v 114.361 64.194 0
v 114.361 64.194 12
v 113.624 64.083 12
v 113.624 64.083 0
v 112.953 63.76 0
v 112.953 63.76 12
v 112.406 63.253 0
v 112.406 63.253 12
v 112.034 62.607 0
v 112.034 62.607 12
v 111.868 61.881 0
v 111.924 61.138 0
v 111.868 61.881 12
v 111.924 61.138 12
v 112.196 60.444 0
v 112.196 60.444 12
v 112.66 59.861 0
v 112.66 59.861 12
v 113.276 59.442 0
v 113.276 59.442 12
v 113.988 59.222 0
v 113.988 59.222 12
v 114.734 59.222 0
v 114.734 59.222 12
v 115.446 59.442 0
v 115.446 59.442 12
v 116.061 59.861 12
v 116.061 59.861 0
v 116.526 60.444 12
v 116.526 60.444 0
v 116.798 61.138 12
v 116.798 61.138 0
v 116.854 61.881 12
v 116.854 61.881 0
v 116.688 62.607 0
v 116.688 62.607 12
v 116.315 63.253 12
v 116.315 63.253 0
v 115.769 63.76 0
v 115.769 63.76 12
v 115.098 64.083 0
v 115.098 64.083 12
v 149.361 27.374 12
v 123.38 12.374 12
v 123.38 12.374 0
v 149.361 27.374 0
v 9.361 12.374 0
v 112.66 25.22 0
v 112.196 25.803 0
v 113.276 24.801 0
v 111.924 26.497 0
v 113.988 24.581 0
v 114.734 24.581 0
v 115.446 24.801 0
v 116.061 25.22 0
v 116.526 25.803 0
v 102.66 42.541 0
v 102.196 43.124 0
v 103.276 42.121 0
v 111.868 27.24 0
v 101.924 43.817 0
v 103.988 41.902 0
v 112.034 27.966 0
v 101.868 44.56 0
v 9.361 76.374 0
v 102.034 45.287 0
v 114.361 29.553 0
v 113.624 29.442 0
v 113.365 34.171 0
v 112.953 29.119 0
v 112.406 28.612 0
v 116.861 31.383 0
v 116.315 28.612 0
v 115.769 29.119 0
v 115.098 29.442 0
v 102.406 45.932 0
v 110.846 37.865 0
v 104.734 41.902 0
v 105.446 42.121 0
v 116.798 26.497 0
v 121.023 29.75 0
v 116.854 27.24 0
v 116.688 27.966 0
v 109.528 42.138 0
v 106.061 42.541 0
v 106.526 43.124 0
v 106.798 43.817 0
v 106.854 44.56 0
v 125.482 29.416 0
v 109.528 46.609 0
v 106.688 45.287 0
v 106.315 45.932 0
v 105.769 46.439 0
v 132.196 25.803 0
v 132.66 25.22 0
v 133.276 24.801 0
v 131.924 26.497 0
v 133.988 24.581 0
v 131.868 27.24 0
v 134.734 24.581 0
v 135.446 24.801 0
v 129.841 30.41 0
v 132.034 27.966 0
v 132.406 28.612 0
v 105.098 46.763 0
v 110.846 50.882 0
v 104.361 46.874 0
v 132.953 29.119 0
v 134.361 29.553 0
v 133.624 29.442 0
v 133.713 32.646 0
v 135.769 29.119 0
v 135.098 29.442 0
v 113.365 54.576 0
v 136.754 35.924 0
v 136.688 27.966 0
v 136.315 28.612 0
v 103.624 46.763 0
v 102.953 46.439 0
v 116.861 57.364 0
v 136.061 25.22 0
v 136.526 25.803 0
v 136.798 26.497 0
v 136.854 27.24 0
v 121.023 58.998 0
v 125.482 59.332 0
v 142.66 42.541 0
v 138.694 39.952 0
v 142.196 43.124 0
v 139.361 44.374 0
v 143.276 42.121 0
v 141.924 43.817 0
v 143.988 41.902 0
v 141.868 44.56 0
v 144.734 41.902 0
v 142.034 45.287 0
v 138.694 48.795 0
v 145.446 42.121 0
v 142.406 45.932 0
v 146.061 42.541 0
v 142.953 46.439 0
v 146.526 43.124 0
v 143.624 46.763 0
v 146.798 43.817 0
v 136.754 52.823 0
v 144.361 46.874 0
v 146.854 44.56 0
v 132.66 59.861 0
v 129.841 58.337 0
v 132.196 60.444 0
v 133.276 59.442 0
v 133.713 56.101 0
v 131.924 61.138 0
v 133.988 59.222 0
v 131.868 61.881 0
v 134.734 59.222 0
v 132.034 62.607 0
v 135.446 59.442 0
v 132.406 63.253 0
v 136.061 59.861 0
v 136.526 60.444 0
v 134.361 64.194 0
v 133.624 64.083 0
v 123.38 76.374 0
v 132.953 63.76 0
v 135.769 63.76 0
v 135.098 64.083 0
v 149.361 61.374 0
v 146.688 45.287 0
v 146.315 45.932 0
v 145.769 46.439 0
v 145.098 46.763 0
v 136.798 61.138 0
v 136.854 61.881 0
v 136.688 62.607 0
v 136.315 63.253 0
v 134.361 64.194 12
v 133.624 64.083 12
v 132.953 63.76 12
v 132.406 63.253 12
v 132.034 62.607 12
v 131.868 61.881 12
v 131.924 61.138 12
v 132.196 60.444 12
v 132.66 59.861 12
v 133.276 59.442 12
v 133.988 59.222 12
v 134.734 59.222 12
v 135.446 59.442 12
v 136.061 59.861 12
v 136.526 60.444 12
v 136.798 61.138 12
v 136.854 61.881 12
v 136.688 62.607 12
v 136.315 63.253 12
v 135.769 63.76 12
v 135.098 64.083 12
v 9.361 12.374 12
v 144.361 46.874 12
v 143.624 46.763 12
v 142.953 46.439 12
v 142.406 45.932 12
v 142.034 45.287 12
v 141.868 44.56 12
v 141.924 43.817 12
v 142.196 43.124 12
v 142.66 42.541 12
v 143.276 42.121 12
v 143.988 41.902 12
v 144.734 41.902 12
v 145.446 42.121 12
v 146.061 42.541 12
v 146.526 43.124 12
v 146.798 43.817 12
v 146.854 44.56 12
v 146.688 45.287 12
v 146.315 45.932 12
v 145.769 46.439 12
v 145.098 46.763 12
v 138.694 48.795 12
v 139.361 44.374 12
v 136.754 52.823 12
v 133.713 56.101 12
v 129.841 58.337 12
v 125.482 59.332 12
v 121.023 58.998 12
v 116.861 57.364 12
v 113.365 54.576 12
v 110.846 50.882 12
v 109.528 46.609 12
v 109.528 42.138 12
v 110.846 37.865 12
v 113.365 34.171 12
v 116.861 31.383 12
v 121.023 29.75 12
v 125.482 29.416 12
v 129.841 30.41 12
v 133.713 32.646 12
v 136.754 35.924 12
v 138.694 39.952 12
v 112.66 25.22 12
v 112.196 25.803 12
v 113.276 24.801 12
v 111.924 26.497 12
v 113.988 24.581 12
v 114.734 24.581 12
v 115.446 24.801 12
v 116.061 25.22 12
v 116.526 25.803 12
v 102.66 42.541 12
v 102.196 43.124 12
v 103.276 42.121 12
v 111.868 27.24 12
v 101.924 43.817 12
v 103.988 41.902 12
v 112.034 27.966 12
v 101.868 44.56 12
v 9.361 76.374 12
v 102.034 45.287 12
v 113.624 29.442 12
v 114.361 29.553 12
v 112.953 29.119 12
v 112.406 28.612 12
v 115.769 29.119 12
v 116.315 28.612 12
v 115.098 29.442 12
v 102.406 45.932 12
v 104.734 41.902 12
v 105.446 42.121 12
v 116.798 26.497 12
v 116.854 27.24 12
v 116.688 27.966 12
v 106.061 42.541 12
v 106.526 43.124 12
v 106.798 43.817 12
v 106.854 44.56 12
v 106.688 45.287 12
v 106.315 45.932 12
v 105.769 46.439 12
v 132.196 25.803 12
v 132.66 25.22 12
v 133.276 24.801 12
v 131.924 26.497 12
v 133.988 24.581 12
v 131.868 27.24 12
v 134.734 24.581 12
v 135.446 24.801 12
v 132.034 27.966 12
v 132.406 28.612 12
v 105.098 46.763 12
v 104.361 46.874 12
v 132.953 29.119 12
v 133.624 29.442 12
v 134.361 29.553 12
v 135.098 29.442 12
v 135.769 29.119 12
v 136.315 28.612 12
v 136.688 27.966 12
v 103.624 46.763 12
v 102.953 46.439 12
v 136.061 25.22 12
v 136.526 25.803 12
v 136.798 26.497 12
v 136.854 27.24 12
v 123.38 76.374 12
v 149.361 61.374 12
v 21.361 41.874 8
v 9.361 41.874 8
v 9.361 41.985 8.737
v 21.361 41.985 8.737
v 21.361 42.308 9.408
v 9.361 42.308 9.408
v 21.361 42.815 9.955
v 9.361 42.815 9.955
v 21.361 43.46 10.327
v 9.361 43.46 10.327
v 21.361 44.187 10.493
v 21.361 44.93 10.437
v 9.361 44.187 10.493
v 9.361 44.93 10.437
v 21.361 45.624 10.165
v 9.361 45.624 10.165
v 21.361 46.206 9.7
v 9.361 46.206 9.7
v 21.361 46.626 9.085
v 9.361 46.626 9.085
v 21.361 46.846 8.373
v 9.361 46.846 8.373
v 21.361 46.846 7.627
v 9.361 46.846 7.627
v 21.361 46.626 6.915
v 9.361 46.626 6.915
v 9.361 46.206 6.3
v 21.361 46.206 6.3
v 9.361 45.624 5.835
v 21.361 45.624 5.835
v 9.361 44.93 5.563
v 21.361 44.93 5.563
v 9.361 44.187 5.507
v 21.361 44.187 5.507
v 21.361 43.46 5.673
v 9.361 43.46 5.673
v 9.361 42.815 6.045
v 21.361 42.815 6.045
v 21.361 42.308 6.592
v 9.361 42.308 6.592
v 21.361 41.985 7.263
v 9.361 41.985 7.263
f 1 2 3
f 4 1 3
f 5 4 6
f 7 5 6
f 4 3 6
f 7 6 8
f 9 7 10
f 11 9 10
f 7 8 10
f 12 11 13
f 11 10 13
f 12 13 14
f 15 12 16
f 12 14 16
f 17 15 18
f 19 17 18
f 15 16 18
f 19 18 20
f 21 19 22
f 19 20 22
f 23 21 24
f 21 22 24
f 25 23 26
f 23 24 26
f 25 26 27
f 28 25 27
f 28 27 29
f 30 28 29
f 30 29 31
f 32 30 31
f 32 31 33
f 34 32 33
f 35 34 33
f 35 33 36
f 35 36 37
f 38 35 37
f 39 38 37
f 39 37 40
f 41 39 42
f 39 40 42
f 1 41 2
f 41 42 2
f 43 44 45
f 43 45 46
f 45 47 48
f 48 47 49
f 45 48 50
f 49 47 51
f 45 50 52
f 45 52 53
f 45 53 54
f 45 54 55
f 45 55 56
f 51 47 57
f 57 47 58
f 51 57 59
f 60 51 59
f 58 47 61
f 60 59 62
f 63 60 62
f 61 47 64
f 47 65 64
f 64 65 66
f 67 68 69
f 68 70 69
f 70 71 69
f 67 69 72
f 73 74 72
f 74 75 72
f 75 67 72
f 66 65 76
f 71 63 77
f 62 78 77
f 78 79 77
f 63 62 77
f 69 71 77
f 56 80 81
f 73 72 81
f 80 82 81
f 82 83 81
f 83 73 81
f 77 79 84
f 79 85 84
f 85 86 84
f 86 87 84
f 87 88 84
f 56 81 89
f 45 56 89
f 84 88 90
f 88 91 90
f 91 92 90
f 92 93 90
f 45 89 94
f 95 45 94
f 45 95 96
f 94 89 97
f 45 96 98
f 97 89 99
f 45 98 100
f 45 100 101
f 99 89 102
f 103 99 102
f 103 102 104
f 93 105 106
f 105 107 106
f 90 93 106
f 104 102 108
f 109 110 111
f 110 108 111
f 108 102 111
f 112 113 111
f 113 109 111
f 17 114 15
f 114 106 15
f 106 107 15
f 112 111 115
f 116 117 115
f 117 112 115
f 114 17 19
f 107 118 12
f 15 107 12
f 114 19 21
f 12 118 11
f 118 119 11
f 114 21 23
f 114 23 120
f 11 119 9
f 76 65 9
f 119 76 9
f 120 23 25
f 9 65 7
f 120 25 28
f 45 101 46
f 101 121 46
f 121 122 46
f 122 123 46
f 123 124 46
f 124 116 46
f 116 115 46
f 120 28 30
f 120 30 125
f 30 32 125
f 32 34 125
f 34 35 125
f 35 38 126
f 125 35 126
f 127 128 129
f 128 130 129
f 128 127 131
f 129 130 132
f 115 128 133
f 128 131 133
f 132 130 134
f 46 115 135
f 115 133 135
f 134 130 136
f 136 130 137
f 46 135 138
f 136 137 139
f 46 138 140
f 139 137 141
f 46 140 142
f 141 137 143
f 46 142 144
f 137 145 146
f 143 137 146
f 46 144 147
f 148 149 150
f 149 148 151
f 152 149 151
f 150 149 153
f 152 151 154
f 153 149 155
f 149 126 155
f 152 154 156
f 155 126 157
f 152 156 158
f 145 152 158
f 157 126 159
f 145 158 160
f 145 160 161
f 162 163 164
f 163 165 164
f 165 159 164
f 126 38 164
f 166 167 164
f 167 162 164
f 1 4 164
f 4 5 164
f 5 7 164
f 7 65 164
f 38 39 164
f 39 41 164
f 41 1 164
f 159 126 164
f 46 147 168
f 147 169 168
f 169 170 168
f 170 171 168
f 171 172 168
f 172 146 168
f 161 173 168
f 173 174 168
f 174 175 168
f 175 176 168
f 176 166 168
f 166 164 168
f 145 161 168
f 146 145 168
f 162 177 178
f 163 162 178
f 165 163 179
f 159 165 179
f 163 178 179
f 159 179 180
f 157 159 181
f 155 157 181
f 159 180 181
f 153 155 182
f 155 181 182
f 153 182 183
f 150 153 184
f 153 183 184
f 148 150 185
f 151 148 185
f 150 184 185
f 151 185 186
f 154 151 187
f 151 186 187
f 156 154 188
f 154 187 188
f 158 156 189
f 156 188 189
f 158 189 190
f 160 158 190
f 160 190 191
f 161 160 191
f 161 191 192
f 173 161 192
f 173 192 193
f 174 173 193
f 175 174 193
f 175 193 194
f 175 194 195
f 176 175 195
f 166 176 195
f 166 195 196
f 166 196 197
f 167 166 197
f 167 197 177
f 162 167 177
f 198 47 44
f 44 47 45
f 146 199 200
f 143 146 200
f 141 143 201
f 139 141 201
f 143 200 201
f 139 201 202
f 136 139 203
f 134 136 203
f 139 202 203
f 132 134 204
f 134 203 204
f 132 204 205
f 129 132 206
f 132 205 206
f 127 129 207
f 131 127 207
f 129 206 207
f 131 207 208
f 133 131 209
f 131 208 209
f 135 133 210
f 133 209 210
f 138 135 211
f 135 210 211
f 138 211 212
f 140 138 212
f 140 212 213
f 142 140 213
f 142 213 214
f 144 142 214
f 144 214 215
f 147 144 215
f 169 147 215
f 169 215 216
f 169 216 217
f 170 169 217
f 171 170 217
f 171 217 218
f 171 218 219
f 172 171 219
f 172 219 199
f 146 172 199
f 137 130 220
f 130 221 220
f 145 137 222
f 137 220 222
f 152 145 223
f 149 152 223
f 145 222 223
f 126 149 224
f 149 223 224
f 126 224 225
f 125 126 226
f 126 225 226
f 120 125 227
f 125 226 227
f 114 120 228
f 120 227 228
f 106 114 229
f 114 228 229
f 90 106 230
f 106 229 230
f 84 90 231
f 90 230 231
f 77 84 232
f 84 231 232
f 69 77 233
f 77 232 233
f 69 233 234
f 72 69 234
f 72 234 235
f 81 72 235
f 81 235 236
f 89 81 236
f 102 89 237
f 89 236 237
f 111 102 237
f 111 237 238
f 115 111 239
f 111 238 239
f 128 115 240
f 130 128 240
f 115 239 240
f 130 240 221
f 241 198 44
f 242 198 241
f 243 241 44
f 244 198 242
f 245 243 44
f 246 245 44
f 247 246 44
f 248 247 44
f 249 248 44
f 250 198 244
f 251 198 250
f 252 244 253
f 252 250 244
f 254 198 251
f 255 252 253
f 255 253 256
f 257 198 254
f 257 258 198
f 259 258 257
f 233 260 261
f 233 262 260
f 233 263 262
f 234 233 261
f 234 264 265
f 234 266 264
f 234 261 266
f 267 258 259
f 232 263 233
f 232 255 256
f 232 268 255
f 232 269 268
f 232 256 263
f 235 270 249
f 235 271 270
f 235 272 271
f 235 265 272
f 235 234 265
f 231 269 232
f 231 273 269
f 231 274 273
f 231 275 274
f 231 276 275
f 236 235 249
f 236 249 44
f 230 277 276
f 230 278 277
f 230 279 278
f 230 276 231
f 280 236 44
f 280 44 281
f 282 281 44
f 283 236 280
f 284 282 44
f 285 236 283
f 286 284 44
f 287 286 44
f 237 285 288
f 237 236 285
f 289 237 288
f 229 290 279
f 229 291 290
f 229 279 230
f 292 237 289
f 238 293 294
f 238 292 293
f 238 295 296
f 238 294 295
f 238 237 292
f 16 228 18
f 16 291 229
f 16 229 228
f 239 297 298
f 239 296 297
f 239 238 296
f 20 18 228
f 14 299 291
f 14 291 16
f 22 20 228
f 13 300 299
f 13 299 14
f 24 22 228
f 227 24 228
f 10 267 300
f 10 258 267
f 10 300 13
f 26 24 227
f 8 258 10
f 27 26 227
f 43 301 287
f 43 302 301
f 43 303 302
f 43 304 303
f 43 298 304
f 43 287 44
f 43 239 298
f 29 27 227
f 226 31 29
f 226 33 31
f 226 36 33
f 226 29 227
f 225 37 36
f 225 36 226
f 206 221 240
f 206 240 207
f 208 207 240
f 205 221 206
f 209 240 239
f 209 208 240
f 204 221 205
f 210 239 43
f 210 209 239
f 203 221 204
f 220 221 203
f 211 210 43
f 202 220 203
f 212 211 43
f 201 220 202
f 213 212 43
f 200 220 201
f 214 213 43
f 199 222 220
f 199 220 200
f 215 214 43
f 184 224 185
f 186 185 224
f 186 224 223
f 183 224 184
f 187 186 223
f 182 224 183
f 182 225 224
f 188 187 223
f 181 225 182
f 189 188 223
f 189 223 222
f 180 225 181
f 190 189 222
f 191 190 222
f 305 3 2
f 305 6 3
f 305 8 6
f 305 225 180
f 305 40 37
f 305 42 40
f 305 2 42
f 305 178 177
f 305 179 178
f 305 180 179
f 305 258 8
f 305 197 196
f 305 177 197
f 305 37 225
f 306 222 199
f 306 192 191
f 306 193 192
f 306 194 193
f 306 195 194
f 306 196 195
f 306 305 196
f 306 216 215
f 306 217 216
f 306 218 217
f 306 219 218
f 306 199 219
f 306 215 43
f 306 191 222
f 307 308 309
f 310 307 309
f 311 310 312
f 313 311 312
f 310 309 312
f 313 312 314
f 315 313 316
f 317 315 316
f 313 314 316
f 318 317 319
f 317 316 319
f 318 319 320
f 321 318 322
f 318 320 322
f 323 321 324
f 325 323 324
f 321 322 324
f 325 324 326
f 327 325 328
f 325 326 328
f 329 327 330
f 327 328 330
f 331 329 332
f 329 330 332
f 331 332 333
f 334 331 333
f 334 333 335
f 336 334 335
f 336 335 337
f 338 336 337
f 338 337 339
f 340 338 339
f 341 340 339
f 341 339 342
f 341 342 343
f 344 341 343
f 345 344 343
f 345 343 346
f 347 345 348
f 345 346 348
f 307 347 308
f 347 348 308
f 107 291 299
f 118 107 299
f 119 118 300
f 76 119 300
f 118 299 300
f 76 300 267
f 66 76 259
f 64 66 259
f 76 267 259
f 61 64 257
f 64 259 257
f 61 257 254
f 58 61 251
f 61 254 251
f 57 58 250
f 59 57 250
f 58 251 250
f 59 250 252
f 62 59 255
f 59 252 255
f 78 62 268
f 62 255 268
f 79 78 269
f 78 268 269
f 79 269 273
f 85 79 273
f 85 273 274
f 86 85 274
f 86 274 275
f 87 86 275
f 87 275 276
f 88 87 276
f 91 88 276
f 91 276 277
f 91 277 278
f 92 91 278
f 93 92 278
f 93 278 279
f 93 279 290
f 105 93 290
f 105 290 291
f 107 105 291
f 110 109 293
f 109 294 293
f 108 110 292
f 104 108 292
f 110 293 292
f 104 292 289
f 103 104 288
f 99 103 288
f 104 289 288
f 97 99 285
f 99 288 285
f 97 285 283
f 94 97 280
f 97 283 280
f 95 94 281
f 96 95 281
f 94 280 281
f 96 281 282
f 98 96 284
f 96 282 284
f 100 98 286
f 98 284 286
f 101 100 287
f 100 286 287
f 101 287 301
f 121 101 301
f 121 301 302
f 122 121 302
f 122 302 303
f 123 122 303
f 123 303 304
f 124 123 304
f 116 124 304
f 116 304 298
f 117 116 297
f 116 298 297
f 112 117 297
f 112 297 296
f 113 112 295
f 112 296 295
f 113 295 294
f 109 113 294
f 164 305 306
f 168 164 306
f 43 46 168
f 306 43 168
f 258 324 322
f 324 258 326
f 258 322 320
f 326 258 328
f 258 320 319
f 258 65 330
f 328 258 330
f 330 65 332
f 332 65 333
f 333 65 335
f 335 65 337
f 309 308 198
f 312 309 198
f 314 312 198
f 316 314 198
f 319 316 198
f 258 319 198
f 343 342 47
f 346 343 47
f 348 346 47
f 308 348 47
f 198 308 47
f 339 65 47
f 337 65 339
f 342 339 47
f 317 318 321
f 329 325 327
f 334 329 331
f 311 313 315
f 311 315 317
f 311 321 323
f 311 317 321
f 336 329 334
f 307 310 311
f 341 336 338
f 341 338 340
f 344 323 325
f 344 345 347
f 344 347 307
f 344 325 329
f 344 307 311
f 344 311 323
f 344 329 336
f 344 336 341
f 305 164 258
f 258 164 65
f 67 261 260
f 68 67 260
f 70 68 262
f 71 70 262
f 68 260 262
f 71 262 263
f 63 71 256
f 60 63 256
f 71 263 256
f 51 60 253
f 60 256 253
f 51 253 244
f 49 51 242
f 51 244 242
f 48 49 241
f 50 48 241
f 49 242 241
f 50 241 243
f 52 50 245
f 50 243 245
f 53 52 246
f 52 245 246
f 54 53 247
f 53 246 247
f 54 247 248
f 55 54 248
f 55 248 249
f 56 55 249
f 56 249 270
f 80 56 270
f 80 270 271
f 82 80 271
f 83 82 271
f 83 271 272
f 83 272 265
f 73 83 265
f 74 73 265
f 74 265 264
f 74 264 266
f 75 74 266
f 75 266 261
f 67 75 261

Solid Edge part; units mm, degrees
sketch "Sketch1" plane through (0, 0, 0) normal (0, 0, 1) x (1, 0, 0)
  line L0 (9.3609, 12.3736) -> (149.3609, 12.3736)
  line L1 (149.3609, 12.3736) -> (149.3609, 76.3736)
  line L2 (149.3609, 76.3736) -> (9.3609, 76.3736)
  line L3 (9.3609, 76.3736) -> (9.3609, 12.3736)
extrude "Protrusion1" add sketch "Sketch1" along normal blind 12
sketch "Sketch2" plane through (79.3609, 44.3736, 12) normal (0, 0, 1) x (1, 0, 0)
  line L0 (44.0192, 32) -> (70, 17)
  line L1 (70, 32) -> (70, 17)
  line L2 (44.0192, 32) -> (70, 32)
  line L3 (44.0192, -32) -> (70, -17)
  line L4 (70, -17) -> (70, -32)
  line L5 (70, -32) -> (44.0192, -32)
  dimension "D1" = 15
  dimension "D2" = 30
extrude "ExtrudedCutout_2" cut sketch "Sketch2" against normal blind 12
sketch "Sketch3" plane through (79.3609, 44.3736, 12) normal (0, 0, 1) x (1, 0, 0)
  circle A0 centre (45, 0) radius 15
  dimension "D1" = 25
extrude "ExtrudedCutout_3" cut sketch "Sketch3" against normal blind 12
sketch "Sketch4" plane through (79.3609, 44.3736, 12) normal (0, 0, 1) x (0, 1, 0)
  circle A0 centre (0, -25) radius 2.5
  circle A1 centre (0, -65) radius 2.5
  circle A2 centre (17.3205, -35) radius 2.5
  circle A3 centre (-17.3205, -35) radius 2.5
  circle A4 centre (-17.3205, -55) radius 2.5
  circle A5 centre (17.3205, -55) radius 2.5
extrude "ExtrudedCutout_4" cut sketch "Sketch4" against normal blind 12
sketch "Sketch5" plane through (9.3609, 44.3736, 6) normal (-1, 0, 0) x (0, -1, 0)
  circle A0 centre (0, 2) radius 2.5
  dimension "D1" = 8
extrude "Cutout1" cut sketch "Sketch5" against normal blind 12
